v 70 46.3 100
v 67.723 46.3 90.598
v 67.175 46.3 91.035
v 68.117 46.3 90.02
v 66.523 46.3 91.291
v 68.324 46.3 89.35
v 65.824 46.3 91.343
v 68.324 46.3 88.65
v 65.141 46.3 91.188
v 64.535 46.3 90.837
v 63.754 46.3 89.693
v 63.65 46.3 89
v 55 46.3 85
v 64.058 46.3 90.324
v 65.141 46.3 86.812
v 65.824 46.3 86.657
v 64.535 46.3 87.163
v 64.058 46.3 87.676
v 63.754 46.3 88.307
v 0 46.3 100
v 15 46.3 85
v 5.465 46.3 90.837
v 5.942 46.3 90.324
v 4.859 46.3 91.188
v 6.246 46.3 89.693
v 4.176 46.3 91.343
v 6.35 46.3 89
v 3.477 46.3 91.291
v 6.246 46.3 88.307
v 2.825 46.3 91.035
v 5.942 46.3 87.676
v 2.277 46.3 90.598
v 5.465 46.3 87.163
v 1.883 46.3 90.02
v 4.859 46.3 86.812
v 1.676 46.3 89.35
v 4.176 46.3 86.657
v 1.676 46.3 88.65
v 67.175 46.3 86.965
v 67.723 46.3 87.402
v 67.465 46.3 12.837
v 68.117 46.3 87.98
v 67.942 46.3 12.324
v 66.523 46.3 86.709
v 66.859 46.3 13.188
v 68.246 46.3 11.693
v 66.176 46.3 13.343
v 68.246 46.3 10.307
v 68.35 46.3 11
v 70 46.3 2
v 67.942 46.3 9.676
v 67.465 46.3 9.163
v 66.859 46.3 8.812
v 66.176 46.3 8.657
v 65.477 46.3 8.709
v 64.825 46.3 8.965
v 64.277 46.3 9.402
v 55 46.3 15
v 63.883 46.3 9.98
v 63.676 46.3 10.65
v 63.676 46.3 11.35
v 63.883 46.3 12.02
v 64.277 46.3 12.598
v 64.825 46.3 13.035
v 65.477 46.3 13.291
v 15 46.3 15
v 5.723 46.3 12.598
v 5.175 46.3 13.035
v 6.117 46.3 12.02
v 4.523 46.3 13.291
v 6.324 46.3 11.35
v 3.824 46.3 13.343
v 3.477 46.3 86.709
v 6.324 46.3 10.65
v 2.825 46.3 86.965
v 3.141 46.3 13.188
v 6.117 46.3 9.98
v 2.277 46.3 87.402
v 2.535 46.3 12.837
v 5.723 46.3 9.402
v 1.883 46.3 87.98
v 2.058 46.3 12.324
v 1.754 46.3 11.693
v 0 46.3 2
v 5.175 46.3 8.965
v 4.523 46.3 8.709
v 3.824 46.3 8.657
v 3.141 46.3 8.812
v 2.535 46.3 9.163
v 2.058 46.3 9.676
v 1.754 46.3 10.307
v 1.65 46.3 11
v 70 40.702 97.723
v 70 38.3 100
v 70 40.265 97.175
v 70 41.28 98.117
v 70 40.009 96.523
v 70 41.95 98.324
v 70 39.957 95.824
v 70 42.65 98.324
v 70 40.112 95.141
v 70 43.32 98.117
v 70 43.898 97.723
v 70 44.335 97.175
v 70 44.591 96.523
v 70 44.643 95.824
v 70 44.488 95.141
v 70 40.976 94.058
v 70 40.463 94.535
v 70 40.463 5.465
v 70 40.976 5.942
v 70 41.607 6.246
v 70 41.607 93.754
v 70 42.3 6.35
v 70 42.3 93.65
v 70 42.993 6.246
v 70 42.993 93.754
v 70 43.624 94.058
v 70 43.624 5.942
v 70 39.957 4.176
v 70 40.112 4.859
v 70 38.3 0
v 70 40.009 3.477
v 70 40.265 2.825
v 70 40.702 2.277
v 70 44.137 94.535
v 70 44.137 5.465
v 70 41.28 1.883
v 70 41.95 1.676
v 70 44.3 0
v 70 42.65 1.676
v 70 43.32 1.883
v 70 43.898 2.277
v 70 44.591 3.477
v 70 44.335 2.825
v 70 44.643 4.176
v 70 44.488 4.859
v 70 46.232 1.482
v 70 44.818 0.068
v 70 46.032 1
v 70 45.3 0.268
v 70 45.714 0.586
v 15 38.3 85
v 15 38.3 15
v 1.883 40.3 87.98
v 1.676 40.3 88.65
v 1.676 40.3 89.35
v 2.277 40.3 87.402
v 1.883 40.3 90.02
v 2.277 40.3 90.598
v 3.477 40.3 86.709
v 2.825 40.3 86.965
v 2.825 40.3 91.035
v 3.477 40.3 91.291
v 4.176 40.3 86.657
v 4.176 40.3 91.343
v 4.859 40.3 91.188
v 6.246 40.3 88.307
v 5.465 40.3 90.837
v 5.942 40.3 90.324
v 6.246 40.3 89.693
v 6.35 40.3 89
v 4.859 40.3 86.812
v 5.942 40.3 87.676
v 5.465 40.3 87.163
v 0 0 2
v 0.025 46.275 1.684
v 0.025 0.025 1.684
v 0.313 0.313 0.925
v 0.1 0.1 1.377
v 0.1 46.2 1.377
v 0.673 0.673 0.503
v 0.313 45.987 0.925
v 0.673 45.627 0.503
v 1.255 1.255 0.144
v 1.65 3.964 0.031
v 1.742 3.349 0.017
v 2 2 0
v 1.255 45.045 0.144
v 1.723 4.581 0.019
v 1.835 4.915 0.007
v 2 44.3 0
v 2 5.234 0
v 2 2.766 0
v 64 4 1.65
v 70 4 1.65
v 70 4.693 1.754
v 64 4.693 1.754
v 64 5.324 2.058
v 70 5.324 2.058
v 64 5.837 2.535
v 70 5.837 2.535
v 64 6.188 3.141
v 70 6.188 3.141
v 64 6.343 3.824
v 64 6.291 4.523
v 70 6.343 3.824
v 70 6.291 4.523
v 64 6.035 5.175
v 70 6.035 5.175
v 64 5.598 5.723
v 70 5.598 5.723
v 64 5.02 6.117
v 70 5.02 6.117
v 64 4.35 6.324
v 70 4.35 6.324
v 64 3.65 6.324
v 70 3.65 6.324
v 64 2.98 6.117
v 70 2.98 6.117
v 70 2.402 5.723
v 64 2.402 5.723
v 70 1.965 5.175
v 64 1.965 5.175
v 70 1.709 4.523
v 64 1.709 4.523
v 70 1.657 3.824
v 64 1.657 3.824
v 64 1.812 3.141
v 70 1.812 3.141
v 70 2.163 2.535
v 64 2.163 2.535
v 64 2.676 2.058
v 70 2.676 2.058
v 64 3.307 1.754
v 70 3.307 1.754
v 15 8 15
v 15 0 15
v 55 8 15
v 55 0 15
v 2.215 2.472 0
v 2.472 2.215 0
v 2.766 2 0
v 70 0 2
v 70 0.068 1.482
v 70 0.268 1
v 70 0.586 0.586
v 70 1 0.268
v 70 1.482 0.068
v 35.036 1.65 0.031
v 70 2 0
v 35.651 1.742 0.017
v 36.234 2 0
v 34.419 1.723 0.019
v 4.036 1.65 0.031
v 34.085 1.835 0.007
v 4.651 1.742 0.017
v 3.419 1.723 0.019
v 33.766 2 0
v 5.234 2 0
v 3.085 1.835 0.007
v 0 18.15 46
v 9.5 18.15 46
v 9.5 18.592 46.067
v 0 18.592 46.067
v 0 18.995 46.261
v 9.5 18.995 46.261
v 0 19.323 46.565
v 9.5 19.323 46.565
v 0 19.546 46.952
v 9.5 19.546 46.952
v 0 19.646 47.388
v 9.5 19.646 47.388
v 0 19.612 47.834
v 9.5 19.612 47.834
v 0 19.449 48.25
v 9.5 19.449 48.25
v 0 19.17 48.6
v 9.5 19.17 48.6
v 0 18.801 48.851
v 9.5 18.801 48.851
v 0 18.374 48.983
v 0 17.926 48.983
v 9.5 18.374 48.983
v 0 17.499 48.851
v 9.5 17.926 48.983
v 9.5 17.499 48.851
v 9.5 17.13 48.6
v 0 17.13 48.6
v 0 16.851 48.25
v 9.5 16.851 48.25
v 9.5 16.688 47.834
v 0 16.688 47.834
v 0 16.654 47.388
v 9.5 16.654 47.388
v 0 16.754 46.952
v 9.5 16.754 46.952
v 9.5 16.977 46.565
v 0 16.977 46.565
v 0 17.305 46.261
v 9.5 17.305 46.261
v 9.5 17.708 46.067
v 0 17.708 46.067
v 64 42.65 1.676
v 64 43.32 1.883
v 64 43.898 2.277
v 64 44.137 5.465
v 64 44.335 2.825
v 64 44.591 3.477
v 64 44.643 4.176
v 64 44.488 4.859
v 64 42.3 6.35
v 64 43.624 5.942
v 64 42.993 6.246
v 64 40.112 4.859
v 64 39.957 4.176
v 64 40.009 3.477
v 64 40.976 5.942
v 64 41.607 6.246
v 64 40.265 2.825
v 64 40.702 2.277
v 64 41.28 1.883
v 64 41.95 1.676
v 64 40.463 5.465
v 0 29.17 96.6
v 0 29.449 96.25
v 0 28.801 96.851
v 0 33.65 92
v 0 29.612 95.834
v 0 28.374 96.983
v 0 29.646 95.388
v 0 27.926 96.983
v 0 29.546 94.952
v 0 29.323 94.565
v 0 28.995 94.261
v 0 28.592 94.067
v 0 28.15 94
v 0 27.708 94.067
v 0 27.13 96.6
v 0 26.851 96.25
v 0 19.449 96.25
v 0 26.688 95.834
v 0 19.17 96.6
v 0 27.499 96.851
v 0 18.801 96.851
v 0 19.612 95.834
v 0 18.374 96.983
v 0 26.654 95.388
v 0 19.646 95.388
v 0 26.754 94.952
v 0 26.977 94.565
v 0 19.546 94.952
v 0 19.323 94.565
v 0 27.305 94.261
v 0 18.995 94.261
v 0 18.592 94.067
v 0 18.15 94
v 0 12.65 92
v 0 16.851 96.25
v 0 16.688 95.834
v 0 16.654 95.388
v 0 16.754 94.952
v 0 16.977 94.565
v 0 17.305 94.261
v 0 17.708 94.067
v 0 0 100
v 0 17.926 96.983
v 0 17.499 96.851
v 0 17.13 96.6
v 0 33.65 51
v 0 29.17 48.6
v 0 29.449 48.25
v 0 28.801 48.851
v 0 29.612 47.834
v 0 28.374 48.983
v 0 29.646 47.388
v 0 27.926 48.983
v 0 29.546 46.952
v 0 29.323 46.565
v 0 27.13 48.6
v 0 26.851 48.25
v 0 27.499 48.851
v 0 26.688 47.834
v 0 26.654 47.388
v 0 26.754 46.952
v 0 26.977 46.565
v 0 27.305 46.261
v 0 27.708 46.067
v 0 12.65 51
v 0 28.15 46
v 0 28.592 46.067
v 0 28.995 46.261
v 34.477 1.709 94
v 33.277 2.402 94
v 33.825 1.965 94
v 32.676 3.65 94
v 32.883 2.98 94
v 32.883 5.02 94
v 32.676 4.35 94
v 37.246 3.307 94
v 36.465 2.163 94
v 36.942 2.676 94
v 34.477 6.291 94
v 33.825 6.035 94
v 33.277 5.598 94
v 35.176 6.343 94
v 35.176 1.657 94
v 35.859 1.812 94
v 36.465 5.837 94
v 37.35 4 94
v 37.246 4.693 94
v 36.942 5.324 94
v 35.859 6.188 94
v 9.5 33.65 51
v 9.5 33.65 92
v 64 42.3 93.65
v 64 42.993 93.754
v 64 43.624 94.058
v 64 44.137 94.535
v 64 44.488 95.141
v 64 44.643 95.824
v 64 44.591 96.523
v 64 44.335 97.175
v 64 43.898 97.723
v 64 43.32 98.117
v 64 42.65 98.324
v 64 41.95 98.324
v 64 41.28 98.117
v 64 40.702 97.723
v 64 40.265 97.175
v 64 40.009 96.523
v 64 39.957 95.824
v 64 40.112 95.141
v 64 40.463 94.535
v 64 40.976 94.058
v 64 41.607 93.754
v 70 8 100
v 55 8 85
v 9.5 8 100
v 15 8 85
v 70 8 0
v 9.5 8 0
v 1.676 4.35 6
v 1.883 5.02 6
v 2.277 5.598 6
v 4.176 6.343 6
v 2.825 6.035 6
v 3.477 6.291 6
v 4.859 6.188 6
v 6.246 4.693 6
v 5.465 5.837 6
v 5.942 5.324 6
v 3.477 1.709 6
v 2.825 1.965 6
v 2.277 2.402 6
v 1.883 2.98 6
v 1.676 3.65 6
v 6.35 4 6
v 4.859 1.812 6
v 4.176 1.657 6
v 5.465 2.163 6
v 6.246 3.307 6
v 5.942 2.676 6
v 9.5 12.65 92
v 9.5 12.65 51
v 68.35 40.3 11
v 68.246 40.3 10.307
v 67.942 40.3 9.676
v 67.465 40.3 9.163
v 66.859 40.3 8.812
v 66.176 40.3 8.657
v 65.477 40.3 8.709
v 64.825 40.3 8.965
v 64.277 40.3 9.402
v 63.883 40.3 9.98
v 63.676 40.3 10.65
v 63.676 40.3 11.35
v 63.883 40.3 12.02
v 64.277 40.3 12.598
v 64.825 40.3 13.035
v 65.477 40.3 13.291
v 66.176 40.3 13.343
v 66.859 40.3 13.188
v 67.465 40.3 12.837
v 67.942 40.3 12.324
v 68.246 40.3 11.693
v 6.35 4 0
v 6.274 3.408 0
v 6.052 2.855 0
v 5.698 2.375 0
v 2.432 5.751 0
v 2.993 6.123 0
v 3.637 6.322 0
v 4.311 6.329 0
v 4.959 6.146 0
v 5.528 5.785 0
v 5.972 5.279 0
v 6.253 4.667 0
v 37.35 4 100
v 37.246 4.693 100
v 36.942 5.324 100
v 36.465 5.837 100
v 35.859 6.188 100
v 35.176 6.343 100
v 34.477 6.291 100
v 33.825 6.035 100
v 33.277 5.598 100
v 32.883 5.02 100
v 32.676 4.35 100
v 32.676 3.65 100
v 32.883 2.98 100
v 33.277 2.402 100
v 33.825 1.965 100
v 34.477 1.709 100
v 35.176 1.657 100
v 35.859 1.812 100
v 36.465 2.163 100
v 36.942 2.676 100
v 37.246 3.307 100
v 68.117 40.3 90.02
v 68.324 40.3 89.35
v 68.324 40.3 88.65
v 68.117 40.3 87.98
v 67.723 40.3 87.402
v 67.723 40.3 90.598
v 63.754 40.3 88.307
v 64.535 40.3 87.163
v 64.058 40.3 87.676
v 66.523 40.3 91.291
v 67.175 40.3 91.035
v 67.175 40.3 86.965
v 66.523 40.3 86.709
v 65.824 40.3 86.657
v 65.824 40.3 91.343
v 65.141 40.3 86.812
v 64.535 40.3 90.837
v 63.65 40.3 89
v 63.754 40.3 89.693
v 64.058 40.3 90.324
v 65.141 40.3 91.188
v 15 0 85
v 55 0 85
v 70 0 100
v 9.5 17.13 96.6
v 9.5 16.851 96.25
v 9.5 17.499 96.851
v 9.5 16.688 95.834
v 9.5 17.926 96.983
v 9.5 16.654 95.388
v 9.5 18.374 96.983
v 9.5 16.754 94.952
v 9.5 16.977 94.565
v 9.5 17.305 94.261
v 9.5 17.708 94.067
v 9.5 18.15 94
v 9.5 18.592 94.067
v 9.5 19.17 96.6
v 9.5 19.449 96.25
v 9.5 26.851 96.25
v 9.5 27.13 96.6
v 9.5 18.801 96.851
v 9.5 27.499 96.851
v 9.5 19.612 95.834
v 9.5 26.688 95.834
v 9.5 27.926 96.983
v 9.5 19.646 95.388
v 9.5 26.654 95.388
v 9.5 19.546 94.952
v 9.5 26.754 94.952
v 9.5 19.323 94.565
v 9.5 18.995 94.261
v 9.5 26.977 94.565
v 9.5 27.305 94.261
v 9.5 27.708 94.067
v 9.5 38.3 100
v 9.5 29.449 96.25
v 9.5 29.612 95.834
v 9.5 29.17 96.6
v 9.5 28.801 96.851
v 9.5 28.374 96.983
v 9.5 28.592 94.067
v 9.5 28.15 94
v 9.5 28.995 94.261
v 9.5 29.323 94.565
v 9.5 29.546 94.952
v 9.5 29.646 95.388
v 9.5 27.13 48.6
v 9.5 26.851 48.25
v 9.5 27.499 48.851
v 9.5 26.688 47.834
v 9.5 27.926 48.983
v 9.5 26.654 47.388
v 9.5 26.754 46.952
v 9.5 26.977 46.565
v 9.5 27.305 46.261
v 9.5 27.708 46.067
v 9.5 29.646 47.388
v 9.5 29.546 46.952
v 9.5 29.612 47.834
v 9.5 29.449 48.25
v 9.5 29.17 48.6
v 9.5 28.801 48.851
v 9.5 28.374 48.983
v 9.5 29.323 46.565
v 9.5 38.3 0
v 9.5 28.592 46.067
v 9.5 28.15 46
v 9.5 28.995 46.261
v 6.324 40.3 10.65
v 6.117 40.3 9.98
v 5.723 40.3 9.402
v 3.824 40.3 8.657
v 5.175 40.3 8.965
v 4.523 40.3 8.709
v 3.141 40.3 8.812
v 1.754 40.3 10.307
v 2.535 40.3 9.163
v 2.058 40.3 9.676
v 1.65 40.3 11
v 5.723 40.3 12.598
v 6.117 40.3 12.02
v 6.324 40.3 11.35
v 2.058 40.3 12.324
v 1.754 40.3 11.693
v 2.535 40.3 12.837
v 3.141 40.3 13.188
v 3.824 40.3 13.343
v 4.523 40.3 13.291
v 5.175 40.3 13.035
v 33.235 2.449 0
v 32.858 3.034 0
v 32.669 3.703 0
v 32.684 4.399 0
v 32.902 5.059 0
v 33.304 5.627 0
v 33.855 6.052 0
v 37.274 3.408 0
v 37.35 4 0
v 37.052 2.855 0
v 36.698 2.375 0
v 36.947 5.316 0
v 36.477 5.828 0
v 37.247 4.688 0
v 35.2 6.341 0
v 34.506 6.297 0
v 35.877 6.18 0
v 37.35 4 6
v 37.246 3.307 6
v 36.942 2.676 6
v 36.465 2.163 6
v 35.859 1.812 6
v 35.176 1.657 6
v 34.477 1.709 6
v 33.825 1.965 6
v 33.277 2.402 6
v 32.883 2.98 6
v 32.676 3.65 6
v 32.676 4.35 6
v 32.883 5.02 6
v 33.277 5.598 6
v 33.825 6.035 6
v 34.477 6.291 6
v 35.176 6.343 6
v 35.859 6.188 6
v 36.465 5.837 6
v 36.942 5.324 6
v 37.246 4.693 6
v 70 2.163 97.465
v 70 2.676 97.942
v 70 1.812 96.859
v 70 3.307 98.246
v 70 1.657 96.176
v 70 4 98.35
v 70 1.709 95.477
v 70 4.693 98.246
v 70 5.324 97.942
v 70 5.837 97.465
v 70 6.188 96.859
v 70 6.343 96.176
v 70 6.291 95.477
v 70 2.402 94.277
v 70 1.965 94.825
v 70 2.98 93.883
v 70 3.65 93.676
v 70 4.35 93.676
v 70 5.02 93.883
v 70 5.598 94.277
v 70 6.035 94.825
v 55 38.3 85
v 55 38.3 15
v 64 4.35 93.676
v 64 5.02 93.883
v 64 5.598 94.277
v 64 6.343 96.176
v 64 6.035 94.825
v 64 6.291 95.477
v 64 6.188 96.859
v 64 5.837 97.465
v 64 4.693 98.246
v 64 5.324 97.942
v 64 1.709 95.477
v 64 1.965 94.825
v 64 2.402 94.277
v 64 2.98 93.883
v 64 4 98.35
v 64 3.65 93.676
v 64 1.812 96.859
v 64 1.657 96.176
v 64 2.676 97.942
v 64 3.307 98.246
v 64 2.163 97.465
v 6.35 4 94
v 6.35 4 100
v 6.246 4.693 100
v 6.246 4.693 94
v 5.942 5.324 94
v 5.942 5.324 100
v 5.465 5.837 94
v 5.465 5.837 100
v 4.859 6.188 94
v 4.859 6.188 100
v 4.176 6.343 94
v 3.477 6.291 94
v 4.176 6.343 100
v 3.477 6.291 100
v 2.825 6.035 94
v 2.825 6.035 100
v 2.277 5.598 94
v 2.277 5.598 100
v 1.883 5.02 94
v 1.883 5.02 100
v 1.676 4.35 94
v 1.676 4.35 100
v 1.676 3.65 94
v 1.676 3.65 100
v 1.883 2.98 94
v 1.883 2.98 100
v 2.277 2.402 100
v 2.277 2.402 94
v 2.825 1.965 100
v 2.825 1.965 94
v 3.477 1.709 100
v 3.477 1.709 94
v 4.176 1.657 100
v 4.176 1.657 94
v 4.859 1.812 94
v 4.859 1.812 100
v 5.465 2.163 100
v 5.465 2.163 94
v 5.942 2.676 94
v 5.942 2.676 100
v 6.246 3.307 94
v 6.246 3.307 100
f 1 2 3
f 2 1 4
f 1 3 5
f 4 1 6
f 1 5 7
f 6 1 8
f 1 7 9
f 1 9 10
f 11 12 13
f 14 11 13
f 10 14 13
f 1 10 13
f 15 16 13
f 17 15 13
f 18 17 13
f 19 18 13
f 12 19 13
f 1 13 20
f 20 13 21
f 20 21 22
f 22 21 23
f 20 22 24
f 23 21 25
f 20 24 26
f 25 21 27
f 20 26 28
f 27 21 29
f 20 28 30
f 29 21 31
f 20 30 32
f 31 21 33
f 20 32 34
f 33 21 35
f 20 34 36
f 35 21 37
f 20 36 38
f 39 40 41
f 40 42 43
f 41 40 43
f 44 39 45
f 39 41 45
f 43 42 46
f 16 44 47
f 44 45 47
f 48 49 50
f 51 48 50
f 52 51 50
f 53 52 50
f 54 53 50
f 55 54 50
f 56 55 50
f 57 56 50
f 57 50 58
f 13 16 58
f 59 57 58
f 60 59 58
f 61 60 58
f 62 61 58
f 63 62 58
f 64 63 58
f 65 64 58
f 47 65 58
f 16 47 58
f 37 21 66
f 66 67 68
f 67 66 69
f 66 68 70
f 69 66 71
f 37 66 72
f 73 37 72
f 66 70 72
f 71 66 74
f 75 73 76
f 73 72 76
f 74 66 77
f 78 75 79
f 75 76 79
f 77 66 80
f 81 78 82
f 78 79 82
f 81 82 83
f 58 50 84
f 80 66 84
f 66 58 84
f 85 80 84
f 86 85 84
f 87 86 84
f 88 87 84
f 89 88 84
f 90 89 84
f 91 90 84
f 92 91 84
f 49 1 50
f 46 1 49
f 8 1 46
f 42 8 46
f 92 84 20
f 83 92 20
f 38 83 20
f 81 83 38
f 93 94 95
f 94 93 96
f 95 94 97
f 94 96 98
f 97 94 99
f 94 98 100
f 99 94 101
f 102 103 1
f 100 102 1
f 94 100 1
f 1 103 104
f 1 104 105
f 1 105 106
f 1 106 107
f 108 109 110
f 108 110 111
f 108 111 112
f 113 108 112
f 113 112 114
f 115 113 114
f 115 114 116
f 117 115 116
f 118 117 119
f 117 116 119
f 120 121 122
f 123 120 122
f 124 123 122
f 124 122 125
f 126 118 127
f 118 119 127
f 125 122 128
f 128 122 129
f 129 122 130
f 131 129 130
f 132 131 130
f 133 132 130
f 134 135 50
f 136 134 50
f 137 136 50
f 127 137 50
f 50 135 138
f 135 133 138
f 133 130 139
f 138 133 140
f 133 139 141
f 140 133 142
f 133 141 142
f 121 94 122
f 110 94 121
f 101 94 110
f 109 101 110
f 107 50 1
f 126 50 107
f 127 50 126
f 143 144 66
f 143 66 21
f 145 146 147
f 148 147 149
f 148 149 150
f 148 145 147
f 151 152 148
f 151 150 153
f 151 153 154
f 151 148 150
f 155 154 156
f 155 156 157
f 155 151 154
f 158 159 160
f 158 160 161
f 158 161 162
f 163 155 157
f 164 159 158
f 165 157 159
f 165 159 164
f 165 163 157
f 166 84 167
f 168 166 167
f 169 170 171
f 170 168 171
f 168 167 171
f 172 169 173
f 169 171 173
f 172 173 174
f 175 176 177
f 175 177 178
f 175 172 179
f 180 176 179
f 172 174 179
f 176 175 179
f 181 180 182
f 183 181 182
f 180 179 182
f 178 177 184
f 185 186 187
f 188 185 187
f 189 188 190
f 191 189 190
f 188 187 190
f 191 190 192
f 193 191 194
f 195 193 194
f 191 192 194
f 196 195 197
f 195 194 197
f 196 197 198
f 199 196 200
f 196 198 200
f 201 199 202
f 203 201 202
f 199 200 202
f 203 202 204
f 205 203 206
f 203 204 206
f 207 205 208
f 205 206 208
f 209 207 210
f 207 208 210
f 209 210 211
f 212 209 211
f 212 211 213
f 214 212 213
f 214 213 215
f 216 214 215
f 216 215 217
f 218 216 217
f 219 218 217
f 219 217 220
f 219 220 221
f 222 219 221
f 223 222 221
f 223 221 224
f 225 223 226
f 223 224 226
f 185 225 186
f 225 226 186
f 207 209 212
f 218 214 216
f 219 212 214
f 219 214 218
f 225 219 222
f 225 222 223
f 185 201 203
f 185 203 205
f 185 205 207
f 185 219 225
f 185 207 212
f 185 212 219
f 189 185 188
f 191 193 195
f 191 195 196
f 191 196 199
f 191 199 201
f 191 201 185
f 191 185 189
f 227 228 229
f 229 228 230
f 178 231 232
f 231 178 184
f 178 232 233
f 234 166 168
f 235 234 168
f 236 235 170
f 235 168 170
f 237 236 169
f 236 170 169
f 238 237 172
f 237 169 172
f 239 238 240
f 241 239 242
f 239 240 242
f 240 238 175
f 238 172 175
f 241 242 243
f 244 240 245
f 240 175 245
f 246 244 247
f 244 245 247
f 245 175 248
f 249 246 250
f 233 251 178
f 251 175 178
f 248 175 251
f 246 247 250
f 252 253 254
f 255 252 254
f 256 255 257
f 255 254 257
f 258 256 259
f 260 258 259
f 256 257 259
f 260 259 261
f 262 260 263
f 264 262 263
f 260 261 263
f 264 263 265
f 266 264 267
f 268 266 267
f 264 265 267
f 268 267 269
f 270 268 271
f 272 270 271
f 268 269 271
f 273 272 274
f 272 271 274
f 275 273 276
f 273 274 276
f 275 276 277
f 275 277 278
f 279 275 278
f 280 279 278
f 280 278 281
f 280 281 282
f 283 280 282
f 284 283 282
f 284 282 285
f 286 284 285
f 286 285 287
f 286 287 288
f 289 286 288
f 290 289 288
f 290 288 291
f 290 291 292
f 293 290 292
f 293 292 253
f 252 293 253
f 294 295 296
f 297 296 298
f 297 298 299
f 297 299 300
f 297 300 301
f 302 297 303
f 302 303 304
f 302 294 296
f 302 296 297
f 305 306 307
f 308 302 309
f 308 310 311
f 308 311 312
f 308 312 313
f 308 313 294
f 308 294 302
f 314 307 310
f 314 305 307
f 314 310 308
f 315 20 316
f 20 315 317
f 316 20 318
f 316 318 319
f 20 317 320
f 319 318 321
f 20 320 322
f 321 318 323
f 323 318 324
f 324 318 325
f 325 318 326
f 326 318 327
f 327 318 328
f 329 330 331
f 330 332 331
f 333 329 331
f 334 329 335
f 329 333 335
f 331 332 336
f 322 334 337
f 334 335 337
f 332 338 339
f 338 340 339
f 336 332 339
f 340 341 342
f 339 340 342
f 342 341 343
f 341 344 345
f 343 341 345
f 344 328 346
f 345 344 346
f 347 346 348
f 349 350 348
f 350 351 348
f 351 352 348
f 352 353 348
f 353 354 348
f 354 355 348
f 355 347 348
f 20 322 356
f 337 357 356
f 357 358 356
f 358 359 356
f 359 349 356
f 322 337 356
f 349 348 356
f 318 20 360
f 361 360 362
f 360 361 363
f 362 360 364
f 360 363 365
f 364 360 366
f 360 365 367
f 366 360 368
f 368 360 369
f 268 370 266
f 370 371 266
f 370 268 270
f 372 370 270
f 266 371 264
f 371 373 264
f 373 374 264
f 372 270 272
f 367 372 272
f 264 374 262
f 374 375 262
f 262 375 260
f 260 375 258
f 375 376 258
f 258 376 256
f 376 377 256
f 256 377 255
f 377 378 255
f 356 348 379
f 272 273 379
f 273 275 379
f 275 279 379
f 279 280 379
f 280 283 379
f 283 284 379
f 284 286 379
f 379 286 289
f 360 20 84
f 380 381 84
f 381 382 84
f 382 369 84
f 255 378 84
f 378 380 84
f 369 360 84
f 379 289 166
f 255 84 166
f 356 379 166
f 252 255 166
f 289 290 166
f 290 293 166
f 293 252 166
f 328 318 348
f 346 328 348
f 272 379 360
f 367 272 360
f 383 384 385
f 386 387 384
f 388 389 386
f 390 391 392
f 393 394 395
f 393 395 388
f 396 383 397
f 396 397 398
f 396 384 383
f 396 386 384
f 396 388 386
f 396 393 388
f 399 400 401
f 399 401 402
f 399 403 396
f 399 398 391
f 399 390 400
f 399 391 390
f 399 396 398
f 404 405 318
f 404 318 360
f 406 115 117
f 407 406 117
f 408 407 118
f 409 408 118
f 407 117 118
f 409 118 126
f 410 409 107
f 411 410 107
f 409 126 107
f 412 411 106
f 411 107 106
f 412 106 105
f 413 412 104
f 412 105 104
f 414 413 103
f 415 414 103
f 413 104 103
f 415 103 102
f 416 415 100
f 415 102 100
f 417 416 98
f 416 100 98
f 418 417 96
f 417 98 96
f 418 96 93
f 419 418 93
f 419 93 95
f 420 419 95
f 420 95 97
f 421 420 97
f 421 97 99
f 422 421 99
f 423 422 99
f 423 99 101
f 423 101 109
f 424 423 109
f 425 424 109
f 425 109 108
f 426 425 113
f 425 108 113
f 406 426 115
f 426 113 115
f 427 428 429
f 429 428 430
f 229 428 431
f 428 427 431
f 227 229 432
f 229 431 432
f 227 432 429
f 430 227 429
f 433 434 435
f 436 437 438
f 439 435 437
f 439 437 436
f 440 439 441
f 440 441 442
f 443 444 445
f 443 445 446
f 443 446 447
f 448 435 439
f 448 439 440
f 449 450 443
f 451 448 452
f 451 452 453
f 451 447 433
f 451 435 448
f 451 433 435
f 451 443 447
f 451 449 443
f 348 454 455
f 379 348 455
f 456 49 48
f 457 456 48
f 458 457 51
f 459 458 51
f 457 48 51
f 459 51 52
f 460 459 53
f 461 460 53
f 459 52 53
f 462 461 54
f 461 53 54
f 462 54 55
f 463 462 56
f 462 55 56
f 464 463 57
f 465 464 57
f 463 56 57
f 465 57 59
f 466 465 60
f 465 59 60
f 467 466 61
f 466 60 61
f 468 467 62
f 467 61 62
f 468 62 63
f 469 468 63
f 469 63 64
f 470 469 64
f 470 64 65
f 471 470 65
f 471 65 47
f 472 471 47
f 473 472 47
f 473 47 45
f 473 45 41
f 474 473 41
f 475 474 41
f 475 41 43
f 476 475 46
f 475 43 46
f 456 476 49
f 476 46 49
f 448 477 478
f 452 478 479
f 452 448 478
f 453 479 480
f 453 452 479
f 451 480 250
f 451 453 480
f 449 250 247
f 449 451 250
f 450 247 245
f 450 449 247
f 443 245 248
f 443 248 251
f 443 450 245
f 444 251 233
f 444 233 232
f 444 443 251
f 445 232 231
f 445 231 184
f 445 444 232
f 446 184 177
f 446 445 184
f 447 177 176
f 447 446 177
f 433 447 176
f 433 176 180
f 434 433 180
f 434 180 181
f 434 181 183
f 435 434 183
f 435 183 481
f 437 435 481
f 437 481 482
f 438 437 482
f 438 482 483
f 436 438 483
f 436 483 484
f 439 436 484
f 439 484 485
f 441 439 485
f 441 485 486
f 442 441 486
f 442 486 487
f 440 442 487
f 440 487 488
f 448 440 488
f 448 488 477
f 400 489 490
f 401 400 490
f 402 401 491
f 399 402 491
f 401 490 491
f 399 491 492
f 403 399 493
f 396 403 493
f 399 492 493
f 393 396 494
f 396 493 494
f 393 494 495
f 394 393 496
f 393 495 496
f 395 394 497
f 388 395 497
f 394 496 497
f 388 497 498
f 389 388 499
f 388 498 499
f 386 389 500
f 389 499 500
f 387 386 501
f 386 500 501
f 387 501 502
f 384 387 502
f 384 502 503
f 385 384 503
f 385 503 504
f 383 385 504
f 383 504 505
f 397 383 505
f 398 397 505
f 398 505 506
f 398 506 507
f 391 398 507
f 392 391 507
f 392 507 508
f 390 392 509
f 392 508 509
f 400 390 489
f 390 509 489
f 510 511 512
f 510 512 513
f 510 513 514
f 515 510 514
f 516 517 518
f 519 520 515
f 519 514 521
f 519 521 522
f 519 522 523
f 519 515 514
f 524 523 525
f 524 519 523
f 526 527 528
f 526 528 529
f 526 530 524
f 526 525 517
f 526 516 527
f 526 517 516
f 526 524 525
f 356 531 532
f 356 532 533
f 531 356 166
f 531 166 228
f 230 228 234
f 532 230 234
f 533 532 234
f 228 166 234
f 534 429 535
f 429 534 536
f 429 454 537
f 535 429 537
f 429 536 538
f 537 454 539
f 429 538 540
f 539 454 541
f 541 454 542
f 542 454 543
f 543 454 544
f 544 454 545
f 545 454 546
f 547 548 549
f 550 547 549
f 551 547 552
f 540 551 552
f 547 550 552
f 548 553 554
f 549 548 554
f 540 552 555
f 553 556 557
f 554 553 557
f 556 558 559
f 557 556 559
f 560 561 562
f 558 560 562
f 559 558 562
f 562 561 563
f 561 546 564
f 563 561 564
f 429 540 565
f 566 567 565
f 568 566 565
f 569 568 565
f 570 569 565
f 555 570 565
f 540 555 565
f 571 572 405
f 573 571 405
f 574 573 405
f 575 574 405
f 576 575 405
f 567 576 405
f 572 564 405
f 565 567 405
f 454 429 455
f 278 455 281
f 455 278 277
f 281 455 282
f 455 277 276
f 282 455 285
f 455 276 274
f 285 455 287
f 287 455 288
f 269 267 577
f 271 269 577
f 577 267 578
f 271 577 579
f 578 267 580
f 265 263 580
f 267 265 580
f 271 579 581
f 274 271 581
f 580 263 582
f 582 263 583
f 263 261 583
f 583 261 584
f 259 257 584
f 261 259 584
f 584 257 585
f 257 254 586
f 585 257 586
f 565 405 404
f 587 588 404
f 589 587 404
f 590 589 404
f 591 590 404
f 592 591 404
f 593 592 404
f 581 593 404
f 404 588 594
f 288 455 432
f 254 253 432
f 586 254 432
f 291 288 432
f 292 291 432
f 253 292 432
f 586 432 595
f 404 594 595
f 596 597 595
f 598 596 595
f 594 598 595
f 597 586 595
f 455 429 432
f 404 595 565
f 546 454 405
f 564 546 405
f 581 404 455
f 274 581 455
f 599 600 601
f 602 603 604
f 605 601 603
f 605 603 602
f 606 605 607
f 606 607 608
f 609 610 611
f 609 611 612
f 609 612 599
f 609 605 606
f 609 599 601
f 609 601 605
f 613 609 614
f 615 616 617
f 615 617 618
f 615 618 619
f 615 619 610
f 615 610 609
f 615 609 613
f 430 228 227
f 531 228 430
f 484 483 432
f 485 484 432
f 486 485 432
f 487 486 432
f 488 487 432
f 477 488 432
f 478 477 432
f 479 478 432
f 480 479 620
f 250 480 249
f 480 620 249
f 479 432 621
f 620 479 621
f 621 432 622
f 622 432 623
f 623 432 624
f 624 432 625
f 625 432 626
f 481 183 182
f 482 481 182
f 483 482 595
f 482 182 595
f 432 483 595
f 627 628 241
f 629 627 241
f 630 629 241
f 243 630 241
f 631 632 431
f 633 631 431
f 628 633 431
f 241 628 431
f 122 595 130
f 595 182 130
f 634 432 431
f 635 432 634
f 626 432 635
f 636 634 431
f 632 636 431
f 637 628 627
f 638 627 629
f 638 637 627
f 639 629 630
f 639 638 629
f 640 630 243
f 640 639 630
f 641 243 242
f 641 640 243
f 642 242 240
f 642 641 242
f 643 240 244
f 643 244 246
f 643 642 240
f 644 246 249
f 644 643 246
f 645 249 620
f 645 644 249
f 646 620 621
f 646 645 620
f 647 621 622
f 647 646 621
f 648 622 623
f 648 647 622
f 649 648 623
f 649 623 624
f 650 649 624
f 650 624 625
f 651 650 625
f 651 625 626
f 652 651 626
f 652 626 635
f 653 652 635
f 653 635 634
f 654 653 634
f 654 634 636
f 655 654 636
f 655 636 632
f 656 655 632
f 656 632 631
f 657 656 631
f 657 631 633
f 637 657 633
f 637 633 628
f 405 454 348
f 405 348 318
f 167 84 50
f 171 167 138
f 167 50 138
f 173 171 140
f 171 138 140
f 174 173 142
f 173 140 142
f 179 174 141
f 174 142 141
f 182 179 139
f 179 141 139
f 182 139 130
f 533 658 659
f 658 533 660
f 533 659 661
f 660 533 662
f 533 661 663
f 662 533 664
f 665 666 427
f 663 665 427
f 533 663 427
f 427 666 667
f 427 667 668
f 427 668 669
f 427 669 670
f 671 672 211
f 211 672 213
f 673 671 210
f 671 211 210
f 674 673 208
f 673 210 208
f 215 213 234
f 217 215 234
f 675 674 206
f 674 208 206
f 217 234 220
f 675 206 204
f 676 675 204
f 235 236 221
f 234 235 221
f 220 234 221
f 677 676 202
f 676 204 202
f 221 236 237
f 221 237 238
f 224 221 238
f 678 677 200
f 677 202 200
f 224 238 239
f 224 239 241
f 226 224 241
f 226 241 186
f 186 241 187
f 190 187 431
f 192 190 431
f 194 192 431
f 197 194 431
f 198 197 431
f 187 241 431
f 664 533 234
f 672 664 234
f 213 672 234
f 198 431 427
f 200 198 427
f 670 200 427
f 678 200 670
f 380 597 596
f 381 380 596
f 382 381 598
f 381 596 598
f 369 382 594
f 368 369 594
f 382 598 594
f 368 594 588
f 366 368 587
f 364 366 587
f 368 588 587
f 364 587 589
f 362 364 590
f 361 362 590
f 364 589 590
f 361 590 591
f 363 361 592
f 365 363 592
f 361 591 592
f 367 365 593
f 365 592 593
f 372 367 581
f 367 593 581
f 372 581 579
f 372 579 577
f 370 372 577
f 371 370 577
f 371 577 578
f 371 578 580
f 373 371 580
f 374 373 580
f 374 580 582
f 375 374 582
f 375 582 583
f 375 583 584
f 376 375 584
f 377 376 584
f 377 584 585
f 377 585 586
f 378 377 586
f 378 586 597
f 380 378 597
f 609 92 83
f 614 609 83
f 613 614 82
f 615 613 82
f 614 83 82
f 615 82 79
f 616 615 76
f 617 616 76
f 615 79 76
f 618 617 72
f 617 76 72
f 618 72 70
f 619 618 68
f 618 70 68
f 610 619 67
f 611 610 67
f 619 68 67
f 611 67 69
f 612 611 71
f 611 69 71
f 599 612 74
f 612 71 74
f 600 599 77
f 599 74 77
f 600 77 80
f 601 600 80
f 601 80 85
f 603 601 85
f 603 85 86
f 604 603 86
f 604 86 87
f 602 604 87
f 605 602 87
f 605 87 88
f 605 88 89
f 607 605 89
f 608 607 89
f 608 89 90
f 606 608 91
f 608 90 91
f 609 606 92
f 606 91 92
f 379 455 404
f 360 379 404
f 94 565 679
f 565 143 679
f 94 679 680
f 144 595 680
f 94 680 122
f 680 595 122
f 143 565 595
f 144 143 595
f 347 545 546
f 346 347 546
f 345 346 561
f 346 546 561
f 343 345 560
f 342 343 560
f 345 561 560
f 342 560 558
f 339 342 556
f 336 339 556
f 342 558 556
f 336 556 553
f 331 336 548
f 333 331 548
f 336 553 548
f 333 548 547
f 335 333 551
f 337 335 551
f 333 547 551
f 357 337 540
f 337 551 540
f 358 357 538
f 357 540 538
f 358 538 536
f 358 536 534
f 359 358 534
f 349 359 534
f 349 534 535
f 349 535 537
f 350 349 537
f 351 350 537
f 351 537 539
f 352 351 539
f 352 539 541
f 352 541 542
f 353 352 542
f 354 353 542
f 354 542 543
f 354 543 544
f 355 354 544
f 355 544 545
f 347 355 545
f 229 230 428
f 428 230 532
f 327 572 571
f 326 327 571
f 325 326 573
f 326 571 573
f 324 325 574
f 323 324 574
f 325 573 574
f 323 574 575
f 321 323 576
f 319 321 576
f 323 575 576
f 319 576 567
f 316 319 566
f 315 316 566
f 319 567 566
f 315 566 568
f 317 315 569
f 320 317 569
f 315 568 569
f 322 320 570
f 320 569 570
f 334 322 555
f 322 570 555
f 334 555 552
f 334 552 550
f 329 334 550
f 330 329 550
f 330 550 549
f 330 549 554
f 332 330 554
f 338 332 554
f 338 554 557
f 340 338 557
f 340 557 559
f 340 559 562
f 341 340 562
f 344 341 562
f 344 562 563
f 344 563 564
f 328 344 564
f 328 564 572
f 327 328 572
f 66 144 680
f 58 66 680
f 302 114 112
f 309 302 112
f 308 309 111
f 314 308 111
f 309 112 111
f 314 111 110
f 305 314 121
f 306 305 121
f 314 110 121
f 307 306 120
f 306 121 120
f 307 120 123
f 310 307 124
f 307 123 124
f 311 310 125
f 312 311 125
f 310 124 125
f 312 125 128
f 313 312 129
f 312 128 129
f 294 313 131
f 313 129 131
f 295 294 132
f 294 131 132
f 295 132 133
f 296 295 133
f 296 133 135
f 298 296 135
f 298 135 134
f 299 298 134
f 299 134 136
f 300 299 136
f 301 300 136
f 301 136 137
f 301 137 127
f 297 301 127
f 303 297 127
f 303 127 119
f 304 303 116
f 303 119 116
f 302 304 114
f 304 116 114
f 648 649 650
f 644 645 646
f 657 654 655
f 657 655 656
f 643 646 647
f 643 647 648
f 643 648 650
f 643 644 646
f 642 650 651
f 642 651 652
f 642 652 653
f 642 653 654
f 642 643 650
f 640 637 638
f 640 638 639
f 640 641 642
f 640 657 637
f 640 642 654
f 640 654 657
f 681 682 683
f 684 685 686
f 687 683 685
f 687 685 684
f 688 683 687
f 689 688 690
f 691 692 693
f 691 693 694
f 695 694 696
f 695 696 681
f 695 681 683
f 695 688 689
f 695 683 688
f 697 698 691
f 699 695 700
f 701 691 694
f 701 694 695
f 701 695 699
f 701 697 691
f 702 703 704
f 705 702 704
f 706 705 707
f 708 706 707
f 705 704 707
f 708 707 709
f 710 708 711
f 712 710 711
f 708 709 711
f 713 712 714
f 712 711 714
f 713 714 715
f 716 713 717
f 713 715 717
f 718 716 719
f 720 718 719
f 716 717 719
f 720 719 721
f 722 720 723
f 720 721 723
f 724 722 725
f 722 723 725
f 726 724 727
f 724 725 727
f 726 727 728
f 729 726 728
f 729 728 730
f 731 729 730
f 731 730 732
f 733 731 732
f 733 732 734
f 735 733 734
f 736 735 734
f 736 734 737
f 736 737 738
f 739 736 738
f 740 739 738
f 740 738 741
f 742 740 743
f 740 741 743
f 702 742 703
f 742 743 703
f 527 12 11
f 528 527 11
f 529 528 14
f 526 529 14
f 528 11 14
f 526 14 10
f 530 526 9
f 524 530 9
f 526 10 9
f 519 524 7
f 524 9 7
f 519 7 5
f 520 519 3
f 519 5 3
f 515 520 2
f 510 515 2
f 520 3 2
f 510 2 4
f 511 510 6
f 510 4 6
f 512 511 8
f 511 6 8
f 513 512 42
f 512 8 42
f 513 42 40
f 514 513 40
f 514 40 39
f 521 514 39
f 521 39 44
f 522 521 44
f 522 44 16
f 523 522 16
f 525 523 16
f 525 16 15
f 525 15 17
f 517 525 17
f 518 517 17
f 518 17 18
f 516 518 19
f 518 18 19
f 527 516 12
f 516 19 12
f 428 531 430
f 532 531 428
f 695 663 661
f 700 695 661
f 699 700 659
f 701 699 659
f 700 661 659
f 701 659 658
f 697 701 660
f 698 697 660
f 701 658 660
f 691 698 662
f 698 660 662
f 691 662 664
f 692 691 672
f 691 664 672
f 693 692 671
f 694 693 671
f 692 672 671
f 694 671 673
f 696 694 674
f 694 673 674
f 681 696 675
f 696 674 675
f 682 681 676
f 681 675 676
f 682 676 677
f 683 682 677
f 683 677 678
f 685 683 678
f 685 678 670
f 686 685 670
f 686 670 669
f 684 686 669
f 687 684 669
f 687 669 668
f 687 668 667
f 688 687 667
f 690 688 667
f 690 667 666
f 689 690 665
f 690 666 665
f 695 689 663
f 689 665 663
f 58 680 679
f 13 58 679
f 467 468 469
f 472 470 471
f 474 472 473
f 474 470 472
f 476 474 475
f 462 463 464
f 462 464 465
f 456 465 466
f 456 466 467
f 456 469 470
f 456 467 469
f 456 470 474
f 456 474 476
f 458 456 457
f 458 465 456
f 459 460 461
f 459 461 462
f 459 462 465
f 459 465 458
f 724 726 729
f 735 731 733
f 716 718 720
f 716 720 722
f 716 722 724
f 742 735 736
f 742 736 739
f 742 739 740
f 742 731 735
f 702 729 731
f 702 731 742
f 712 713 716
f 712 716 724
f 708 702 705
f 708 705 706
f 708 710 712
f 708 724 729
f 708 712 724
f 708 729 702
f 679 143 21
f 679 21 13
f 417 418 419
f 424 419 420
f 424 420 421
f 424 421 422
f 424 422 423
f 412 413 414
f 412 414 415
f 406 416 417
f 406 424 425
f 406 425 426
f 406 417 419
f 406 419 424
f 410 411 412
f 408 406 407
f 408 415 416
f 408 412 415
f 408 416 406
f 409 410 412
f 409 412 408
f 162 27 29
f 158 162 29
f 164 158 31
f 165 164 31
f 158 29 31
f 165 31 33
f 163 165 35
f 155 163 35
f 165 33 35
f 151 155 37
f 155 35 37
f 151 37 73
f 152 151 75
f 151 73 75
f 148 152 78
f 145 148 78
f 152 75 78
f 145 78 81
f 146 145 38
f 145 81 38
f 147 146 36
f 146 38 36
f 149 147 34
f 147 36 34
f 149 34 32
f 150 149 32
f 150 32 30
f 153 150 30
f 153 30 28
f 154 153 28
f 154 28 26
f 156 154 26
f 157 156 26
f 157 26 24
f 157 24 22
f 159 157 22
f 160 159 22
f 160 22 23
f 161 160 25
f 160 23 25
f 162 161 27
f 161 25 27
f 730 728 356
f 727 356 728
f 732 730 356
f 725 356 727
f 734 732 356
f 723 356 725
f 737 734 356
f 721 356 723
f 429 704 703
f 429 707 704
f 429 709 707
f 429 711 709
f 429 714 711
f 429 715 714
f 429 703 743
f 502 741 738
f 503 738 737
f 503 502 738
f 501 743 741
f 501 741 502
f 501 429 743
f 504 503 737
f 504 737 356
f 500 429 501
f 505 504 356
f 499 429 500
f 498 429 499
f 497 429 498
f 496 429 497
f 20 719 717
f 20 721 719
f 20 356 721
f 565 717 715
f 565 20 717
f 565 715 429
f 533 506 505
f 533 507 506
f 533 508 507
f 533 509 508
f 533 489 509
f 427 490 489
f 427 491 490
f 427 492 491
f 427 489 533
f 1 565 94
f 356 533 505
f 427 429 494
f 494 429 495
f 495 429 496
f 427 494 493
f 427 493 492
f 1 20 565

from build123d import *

# Parameters (mm, degrees)
BOSS_EXTRUDE1_DEPTH = 100
SKETCH2_W           = 40
SKETCH2_H           = 70
CUT_EXTRUDE1_DEPTH  = 100
SKETCH3_R           = 2.35
CUT_EXTRUDE2_DEPTH  = 6
CUT_EXTRUDE3_REACH  = 127.714
SKETCH4_R           = 1.5
SKETCH4_W           = 41
SKETCH4_H           = 21
SKETCH5_R           = 2.35
CUT_EXTRUDE4_DEPTH  = 6
SKETCH6_R           = 2.35
CUT_EXTRUDE5_DEPTH  = 6
CUT_EXTRUDE6_START  = -6
SKETCH7_R           = 2.35
CUT_EXTRUDE6_DEPTH  = 6
FILLET2_R           = 2


with BuildPart() as part:
    # Sketch1 → Boss-Extrude1 (new body)
    with BuildSketch(Plane.XY):
        Polygon((0, 46.3), (0, 0), (70, 0), (70, 8), (9.5, 8), (9.5, 38.3), (70, 38.3), (70, 46.3), align=None)
    extrude(amount=BOSS_EXTRUDE1_DEPTH)

    # Sketch2 → Cut-Extrude1 (cut)
    with BuildSketch(Plane.XZ):
        with Locations((35, 50)):
            Rectangle(SKETCH2_W, SKETCH2_H)
    extrude(amount=-CUT_EXTRUDE1_DEPTH, mode=Mode.SUBTRACT)

    # Sketch3 → Cut-Extrude2 (cut)
    with BuildSketch(Plane(origin=(70, 0, 0), x_dir=(0, 0, -1), z_dir=(1, 0, 0))):
        with Locations((-96, 42.3)):
            Circle(SKETCH3_R)
        with Locations(Location((-4, 42.3, 0), (0, 0, 180))):
            Circle(SKETCH3_R)
        with Locations((-4, 4)):
            Circle(SKETCH3_R)
        with Locations(Location((-96, 4, 0), (0, 0, 180))):
            Circle(SKETCH3_R)
    extrude(amount=-CUT_EXTRUDE2_DEPTH, mode=Mode.SUBTRACT)

    # Sketch4 → Cut-Extrude3 (cut, up to next)
    with BuildSketch(Plane(origin=(9.5, 0, 0), x_dir=(0, 0, -1), z_dir=(1, 0, 0)), mode=Mode.PRIVATE) as cut_extrude3_sk1:
        with Locations((-95.5, 28.15)):
            Circle(SKETCH4_R)
    cut_extrude3_tool1 = extrude(cut_extrude3_sk1.sketch, amount=-CUT_EXTRUDE3_REACH, mode=Mode.PRIVATE) & part.part
    # Sketch4 → Cut-Extrude3 (cut, up to next)
    with BuildSketch(Plane(origin=(9.5, 0, 0), x_dir=(0, 0, -1), z_dir=(1, 0, 0)), mode=Mode.PRIVATE) as cut_extrude3_sk2:
        with Locations((-95.5, 18.15)):
            Circle(SKETCH4_R)
    cut_extrude3_tool2 = extrude(cut_extrude3_sk2.sketch, amount=-CUT_EXTRUDE3_REACH, mode=Mode.PRIVATE) & part.part
    # Sketch4 → Cut-Extrude3 (cut, up to next)
    with BuildSketch(Plane(origin=(9.5, 0, 0), x_dir=(0, 0, -1), z_dir=(1, 0, 0)), mode=Mode.PRIVATE) as cut_extrude3_sk3:
        with Locations((-47.5, 18.15)):
            Circle(SKETCH4_R)
    cut_extrude3_tool3 = extrude(cut_extrude3_sk3.sketch, amount=-CUT_EXTRUDE3_REACH, mode=Mode.PRIVATE) & part.part
    # Sketch4 → Cut-Extrude3 (cut, up to next)
    with BuildSketch(Plane(origin=(9.5, 0, 0), x_dir=(0, 0, -1), z_dir=(1, 0, 0)), mode=Mode.PRIVATE) as cut_extrude3_sk4:
        with Locations((-47.5, 28.15)):
            Circle(SKETCH4_R)
    cut_extrude3_tool4 = extrude(cut_extrude3_sk4.sketch, amount=-CUT_EXTRUDE3_REACH, mode=Mode.PRIVATE) & part.part
    # Sketch4 → Cut-Extrude3 (cut, up to next)
    with BuildSketch(Plane(origin=(9.5, 0, 0), x_dir=(0, 0, -1), z_dir=(1, 0, 0)), mode=Mode.PRIVATE) as cut_extrude3_sk5:
        with Locations((-71.5, 23.15)):
            Rectangle(SKETCH4_W, SKETCH4_H)
    cut_extrude3_tool5 = extrude(cut_extrude3_sk5.sketch, amount=-CUT_EXTRUDE3_REACH, mode=Mode.PRIVATE) & part.part
    add(cut_extrude3_tool1.solids().sort_by_distance((9.5, 28.15, 95.5))[0], mode=Mode.SUBTRACT)
    add(cut_extrude3_tool2.solids().sort_by_distance((9.5, 18.15, 95.5))[0], mode=Mode.SUBTRACT)
    add(cut_extrude3_tool3.solids().sort_by_distance((9.5, 18.15, 47.5))[0], mode=Mode.SUBTRACT)
    add(cut_extrude3_tool4.solids().sort_by_distance((9.5, 28.15, 47.5))[0], mode=Mode.SUBTRACT)
    add(cut_extrude3_tool5.solids().sort_by_distance((9.5, 23.15, 71.5))[0], mode=Mode.SUBTRACT)

    # Sketch5 → Cut-Extrude4 (cut)
    with BuildSketch(Plane(origin=(0, 46.3, 0), x_dir=(1, 0, 0), z_dir=(0, 1, 0))):
        with Locations((4, -89)):
            Circle(SKETCH5_R)
        with Locations(Location((66, -89, 0), (0, 0, 180))):
            Circle(SKETCH5_R)
        with Locations((66, -11)):
            Circle(SKETCH5_R)
        with Locations(Location((4, -11, 0), (0, 0, 180))):
            Circle(SKETCH5_R)
    extrude(amount=-CUT_EXTRUDE4_DEPTH, mode=Mode.SUBTRACT)

    # Sketch6 → Cut-Extrude5 (cut)
    with BuildSketch(Plane.XY.offset(100)):
        with Locations((4, 4)):
            Circle(SKETCH6_R)
        with Locations((35, 4)):
            Circle(SKETCH6_R)
    extrude(amount=-CUT_EXTRUDE5_DEPTH, mode=Mode.SUBTRACT)

    # Sketch7 → Cut-Extrude6 (cut)
    with BuildSketch(Plane(origin=(0, 0, 0), x_dir=(-1, 0, 0), z_dir=(0, 0, -1)).offset(CUT_EXTRUDE6_START)):
        with Locations(Location((-35, 4, 0), (0, 0, 180))):
            Circle(SKETCH7_R)
        with Locations(Location((-4, 4, 0), (0, 0, 180))):
            Circle(SKETCH7_R)
    extrude(amount=CUT_EXTRUDE6_DEPTH, mode=Mode.SUBTRACT)

    # Fillet2
    # the kernel refuses this fillet: 2 mm, written as the material it takes off along each edge
    with BuildSketch(Plane(origin=(-5, 0, 0), x_dir=(0, 1, 0), z_dir=(1, 0, 0))) as fillet2_piece_1:
        with BuildLine():
            CenterArc((FILLET2_R, FILLET2_R), FILLET2_R, 180, 90)
            Line((0, FILLET2_R), (0, 0))
            Line((0, 0), (FILLET2_R, 0))
        make_face()
    extrude(amount=80, mode=Mode.SUBTRACT)
    with BuildSketch(Plane(origin=(0, 51.3, 0), x_dir=(0, 0, 1), z_dir=(0, -1, 0))) as fillet2_piece_2:
        with BuildLine():
            CenterArc((FILLET2_R, -FILLET2_R), FILLET2_R, 90, 90)
            Line((0, -FILLET2_R), (0, 0))
            Line((0, 0), (FILLET2_R, 0))
        make_face()
    extrude(amount=56.3, mode=Mode.SUBTRACT)
    with BuildSketch(Plane(origin=(75, 46.3, 0), x_dir=(0, 0, 1), z_dir=(-1, 0, 0))) as fillet2_piece_3:
        with BuildLine():
            CenterArc((FILLET2_R, -FILLET2_R), FILLET2_R, 90, 90)
            Line((0, -FILLET2_R), (0, 0))
            Line((0, 0), (FILLET2_R, 0))
        make_face()
    extrude(amount=80, mode=Mode.SUBTRACT)


solid = part.part
